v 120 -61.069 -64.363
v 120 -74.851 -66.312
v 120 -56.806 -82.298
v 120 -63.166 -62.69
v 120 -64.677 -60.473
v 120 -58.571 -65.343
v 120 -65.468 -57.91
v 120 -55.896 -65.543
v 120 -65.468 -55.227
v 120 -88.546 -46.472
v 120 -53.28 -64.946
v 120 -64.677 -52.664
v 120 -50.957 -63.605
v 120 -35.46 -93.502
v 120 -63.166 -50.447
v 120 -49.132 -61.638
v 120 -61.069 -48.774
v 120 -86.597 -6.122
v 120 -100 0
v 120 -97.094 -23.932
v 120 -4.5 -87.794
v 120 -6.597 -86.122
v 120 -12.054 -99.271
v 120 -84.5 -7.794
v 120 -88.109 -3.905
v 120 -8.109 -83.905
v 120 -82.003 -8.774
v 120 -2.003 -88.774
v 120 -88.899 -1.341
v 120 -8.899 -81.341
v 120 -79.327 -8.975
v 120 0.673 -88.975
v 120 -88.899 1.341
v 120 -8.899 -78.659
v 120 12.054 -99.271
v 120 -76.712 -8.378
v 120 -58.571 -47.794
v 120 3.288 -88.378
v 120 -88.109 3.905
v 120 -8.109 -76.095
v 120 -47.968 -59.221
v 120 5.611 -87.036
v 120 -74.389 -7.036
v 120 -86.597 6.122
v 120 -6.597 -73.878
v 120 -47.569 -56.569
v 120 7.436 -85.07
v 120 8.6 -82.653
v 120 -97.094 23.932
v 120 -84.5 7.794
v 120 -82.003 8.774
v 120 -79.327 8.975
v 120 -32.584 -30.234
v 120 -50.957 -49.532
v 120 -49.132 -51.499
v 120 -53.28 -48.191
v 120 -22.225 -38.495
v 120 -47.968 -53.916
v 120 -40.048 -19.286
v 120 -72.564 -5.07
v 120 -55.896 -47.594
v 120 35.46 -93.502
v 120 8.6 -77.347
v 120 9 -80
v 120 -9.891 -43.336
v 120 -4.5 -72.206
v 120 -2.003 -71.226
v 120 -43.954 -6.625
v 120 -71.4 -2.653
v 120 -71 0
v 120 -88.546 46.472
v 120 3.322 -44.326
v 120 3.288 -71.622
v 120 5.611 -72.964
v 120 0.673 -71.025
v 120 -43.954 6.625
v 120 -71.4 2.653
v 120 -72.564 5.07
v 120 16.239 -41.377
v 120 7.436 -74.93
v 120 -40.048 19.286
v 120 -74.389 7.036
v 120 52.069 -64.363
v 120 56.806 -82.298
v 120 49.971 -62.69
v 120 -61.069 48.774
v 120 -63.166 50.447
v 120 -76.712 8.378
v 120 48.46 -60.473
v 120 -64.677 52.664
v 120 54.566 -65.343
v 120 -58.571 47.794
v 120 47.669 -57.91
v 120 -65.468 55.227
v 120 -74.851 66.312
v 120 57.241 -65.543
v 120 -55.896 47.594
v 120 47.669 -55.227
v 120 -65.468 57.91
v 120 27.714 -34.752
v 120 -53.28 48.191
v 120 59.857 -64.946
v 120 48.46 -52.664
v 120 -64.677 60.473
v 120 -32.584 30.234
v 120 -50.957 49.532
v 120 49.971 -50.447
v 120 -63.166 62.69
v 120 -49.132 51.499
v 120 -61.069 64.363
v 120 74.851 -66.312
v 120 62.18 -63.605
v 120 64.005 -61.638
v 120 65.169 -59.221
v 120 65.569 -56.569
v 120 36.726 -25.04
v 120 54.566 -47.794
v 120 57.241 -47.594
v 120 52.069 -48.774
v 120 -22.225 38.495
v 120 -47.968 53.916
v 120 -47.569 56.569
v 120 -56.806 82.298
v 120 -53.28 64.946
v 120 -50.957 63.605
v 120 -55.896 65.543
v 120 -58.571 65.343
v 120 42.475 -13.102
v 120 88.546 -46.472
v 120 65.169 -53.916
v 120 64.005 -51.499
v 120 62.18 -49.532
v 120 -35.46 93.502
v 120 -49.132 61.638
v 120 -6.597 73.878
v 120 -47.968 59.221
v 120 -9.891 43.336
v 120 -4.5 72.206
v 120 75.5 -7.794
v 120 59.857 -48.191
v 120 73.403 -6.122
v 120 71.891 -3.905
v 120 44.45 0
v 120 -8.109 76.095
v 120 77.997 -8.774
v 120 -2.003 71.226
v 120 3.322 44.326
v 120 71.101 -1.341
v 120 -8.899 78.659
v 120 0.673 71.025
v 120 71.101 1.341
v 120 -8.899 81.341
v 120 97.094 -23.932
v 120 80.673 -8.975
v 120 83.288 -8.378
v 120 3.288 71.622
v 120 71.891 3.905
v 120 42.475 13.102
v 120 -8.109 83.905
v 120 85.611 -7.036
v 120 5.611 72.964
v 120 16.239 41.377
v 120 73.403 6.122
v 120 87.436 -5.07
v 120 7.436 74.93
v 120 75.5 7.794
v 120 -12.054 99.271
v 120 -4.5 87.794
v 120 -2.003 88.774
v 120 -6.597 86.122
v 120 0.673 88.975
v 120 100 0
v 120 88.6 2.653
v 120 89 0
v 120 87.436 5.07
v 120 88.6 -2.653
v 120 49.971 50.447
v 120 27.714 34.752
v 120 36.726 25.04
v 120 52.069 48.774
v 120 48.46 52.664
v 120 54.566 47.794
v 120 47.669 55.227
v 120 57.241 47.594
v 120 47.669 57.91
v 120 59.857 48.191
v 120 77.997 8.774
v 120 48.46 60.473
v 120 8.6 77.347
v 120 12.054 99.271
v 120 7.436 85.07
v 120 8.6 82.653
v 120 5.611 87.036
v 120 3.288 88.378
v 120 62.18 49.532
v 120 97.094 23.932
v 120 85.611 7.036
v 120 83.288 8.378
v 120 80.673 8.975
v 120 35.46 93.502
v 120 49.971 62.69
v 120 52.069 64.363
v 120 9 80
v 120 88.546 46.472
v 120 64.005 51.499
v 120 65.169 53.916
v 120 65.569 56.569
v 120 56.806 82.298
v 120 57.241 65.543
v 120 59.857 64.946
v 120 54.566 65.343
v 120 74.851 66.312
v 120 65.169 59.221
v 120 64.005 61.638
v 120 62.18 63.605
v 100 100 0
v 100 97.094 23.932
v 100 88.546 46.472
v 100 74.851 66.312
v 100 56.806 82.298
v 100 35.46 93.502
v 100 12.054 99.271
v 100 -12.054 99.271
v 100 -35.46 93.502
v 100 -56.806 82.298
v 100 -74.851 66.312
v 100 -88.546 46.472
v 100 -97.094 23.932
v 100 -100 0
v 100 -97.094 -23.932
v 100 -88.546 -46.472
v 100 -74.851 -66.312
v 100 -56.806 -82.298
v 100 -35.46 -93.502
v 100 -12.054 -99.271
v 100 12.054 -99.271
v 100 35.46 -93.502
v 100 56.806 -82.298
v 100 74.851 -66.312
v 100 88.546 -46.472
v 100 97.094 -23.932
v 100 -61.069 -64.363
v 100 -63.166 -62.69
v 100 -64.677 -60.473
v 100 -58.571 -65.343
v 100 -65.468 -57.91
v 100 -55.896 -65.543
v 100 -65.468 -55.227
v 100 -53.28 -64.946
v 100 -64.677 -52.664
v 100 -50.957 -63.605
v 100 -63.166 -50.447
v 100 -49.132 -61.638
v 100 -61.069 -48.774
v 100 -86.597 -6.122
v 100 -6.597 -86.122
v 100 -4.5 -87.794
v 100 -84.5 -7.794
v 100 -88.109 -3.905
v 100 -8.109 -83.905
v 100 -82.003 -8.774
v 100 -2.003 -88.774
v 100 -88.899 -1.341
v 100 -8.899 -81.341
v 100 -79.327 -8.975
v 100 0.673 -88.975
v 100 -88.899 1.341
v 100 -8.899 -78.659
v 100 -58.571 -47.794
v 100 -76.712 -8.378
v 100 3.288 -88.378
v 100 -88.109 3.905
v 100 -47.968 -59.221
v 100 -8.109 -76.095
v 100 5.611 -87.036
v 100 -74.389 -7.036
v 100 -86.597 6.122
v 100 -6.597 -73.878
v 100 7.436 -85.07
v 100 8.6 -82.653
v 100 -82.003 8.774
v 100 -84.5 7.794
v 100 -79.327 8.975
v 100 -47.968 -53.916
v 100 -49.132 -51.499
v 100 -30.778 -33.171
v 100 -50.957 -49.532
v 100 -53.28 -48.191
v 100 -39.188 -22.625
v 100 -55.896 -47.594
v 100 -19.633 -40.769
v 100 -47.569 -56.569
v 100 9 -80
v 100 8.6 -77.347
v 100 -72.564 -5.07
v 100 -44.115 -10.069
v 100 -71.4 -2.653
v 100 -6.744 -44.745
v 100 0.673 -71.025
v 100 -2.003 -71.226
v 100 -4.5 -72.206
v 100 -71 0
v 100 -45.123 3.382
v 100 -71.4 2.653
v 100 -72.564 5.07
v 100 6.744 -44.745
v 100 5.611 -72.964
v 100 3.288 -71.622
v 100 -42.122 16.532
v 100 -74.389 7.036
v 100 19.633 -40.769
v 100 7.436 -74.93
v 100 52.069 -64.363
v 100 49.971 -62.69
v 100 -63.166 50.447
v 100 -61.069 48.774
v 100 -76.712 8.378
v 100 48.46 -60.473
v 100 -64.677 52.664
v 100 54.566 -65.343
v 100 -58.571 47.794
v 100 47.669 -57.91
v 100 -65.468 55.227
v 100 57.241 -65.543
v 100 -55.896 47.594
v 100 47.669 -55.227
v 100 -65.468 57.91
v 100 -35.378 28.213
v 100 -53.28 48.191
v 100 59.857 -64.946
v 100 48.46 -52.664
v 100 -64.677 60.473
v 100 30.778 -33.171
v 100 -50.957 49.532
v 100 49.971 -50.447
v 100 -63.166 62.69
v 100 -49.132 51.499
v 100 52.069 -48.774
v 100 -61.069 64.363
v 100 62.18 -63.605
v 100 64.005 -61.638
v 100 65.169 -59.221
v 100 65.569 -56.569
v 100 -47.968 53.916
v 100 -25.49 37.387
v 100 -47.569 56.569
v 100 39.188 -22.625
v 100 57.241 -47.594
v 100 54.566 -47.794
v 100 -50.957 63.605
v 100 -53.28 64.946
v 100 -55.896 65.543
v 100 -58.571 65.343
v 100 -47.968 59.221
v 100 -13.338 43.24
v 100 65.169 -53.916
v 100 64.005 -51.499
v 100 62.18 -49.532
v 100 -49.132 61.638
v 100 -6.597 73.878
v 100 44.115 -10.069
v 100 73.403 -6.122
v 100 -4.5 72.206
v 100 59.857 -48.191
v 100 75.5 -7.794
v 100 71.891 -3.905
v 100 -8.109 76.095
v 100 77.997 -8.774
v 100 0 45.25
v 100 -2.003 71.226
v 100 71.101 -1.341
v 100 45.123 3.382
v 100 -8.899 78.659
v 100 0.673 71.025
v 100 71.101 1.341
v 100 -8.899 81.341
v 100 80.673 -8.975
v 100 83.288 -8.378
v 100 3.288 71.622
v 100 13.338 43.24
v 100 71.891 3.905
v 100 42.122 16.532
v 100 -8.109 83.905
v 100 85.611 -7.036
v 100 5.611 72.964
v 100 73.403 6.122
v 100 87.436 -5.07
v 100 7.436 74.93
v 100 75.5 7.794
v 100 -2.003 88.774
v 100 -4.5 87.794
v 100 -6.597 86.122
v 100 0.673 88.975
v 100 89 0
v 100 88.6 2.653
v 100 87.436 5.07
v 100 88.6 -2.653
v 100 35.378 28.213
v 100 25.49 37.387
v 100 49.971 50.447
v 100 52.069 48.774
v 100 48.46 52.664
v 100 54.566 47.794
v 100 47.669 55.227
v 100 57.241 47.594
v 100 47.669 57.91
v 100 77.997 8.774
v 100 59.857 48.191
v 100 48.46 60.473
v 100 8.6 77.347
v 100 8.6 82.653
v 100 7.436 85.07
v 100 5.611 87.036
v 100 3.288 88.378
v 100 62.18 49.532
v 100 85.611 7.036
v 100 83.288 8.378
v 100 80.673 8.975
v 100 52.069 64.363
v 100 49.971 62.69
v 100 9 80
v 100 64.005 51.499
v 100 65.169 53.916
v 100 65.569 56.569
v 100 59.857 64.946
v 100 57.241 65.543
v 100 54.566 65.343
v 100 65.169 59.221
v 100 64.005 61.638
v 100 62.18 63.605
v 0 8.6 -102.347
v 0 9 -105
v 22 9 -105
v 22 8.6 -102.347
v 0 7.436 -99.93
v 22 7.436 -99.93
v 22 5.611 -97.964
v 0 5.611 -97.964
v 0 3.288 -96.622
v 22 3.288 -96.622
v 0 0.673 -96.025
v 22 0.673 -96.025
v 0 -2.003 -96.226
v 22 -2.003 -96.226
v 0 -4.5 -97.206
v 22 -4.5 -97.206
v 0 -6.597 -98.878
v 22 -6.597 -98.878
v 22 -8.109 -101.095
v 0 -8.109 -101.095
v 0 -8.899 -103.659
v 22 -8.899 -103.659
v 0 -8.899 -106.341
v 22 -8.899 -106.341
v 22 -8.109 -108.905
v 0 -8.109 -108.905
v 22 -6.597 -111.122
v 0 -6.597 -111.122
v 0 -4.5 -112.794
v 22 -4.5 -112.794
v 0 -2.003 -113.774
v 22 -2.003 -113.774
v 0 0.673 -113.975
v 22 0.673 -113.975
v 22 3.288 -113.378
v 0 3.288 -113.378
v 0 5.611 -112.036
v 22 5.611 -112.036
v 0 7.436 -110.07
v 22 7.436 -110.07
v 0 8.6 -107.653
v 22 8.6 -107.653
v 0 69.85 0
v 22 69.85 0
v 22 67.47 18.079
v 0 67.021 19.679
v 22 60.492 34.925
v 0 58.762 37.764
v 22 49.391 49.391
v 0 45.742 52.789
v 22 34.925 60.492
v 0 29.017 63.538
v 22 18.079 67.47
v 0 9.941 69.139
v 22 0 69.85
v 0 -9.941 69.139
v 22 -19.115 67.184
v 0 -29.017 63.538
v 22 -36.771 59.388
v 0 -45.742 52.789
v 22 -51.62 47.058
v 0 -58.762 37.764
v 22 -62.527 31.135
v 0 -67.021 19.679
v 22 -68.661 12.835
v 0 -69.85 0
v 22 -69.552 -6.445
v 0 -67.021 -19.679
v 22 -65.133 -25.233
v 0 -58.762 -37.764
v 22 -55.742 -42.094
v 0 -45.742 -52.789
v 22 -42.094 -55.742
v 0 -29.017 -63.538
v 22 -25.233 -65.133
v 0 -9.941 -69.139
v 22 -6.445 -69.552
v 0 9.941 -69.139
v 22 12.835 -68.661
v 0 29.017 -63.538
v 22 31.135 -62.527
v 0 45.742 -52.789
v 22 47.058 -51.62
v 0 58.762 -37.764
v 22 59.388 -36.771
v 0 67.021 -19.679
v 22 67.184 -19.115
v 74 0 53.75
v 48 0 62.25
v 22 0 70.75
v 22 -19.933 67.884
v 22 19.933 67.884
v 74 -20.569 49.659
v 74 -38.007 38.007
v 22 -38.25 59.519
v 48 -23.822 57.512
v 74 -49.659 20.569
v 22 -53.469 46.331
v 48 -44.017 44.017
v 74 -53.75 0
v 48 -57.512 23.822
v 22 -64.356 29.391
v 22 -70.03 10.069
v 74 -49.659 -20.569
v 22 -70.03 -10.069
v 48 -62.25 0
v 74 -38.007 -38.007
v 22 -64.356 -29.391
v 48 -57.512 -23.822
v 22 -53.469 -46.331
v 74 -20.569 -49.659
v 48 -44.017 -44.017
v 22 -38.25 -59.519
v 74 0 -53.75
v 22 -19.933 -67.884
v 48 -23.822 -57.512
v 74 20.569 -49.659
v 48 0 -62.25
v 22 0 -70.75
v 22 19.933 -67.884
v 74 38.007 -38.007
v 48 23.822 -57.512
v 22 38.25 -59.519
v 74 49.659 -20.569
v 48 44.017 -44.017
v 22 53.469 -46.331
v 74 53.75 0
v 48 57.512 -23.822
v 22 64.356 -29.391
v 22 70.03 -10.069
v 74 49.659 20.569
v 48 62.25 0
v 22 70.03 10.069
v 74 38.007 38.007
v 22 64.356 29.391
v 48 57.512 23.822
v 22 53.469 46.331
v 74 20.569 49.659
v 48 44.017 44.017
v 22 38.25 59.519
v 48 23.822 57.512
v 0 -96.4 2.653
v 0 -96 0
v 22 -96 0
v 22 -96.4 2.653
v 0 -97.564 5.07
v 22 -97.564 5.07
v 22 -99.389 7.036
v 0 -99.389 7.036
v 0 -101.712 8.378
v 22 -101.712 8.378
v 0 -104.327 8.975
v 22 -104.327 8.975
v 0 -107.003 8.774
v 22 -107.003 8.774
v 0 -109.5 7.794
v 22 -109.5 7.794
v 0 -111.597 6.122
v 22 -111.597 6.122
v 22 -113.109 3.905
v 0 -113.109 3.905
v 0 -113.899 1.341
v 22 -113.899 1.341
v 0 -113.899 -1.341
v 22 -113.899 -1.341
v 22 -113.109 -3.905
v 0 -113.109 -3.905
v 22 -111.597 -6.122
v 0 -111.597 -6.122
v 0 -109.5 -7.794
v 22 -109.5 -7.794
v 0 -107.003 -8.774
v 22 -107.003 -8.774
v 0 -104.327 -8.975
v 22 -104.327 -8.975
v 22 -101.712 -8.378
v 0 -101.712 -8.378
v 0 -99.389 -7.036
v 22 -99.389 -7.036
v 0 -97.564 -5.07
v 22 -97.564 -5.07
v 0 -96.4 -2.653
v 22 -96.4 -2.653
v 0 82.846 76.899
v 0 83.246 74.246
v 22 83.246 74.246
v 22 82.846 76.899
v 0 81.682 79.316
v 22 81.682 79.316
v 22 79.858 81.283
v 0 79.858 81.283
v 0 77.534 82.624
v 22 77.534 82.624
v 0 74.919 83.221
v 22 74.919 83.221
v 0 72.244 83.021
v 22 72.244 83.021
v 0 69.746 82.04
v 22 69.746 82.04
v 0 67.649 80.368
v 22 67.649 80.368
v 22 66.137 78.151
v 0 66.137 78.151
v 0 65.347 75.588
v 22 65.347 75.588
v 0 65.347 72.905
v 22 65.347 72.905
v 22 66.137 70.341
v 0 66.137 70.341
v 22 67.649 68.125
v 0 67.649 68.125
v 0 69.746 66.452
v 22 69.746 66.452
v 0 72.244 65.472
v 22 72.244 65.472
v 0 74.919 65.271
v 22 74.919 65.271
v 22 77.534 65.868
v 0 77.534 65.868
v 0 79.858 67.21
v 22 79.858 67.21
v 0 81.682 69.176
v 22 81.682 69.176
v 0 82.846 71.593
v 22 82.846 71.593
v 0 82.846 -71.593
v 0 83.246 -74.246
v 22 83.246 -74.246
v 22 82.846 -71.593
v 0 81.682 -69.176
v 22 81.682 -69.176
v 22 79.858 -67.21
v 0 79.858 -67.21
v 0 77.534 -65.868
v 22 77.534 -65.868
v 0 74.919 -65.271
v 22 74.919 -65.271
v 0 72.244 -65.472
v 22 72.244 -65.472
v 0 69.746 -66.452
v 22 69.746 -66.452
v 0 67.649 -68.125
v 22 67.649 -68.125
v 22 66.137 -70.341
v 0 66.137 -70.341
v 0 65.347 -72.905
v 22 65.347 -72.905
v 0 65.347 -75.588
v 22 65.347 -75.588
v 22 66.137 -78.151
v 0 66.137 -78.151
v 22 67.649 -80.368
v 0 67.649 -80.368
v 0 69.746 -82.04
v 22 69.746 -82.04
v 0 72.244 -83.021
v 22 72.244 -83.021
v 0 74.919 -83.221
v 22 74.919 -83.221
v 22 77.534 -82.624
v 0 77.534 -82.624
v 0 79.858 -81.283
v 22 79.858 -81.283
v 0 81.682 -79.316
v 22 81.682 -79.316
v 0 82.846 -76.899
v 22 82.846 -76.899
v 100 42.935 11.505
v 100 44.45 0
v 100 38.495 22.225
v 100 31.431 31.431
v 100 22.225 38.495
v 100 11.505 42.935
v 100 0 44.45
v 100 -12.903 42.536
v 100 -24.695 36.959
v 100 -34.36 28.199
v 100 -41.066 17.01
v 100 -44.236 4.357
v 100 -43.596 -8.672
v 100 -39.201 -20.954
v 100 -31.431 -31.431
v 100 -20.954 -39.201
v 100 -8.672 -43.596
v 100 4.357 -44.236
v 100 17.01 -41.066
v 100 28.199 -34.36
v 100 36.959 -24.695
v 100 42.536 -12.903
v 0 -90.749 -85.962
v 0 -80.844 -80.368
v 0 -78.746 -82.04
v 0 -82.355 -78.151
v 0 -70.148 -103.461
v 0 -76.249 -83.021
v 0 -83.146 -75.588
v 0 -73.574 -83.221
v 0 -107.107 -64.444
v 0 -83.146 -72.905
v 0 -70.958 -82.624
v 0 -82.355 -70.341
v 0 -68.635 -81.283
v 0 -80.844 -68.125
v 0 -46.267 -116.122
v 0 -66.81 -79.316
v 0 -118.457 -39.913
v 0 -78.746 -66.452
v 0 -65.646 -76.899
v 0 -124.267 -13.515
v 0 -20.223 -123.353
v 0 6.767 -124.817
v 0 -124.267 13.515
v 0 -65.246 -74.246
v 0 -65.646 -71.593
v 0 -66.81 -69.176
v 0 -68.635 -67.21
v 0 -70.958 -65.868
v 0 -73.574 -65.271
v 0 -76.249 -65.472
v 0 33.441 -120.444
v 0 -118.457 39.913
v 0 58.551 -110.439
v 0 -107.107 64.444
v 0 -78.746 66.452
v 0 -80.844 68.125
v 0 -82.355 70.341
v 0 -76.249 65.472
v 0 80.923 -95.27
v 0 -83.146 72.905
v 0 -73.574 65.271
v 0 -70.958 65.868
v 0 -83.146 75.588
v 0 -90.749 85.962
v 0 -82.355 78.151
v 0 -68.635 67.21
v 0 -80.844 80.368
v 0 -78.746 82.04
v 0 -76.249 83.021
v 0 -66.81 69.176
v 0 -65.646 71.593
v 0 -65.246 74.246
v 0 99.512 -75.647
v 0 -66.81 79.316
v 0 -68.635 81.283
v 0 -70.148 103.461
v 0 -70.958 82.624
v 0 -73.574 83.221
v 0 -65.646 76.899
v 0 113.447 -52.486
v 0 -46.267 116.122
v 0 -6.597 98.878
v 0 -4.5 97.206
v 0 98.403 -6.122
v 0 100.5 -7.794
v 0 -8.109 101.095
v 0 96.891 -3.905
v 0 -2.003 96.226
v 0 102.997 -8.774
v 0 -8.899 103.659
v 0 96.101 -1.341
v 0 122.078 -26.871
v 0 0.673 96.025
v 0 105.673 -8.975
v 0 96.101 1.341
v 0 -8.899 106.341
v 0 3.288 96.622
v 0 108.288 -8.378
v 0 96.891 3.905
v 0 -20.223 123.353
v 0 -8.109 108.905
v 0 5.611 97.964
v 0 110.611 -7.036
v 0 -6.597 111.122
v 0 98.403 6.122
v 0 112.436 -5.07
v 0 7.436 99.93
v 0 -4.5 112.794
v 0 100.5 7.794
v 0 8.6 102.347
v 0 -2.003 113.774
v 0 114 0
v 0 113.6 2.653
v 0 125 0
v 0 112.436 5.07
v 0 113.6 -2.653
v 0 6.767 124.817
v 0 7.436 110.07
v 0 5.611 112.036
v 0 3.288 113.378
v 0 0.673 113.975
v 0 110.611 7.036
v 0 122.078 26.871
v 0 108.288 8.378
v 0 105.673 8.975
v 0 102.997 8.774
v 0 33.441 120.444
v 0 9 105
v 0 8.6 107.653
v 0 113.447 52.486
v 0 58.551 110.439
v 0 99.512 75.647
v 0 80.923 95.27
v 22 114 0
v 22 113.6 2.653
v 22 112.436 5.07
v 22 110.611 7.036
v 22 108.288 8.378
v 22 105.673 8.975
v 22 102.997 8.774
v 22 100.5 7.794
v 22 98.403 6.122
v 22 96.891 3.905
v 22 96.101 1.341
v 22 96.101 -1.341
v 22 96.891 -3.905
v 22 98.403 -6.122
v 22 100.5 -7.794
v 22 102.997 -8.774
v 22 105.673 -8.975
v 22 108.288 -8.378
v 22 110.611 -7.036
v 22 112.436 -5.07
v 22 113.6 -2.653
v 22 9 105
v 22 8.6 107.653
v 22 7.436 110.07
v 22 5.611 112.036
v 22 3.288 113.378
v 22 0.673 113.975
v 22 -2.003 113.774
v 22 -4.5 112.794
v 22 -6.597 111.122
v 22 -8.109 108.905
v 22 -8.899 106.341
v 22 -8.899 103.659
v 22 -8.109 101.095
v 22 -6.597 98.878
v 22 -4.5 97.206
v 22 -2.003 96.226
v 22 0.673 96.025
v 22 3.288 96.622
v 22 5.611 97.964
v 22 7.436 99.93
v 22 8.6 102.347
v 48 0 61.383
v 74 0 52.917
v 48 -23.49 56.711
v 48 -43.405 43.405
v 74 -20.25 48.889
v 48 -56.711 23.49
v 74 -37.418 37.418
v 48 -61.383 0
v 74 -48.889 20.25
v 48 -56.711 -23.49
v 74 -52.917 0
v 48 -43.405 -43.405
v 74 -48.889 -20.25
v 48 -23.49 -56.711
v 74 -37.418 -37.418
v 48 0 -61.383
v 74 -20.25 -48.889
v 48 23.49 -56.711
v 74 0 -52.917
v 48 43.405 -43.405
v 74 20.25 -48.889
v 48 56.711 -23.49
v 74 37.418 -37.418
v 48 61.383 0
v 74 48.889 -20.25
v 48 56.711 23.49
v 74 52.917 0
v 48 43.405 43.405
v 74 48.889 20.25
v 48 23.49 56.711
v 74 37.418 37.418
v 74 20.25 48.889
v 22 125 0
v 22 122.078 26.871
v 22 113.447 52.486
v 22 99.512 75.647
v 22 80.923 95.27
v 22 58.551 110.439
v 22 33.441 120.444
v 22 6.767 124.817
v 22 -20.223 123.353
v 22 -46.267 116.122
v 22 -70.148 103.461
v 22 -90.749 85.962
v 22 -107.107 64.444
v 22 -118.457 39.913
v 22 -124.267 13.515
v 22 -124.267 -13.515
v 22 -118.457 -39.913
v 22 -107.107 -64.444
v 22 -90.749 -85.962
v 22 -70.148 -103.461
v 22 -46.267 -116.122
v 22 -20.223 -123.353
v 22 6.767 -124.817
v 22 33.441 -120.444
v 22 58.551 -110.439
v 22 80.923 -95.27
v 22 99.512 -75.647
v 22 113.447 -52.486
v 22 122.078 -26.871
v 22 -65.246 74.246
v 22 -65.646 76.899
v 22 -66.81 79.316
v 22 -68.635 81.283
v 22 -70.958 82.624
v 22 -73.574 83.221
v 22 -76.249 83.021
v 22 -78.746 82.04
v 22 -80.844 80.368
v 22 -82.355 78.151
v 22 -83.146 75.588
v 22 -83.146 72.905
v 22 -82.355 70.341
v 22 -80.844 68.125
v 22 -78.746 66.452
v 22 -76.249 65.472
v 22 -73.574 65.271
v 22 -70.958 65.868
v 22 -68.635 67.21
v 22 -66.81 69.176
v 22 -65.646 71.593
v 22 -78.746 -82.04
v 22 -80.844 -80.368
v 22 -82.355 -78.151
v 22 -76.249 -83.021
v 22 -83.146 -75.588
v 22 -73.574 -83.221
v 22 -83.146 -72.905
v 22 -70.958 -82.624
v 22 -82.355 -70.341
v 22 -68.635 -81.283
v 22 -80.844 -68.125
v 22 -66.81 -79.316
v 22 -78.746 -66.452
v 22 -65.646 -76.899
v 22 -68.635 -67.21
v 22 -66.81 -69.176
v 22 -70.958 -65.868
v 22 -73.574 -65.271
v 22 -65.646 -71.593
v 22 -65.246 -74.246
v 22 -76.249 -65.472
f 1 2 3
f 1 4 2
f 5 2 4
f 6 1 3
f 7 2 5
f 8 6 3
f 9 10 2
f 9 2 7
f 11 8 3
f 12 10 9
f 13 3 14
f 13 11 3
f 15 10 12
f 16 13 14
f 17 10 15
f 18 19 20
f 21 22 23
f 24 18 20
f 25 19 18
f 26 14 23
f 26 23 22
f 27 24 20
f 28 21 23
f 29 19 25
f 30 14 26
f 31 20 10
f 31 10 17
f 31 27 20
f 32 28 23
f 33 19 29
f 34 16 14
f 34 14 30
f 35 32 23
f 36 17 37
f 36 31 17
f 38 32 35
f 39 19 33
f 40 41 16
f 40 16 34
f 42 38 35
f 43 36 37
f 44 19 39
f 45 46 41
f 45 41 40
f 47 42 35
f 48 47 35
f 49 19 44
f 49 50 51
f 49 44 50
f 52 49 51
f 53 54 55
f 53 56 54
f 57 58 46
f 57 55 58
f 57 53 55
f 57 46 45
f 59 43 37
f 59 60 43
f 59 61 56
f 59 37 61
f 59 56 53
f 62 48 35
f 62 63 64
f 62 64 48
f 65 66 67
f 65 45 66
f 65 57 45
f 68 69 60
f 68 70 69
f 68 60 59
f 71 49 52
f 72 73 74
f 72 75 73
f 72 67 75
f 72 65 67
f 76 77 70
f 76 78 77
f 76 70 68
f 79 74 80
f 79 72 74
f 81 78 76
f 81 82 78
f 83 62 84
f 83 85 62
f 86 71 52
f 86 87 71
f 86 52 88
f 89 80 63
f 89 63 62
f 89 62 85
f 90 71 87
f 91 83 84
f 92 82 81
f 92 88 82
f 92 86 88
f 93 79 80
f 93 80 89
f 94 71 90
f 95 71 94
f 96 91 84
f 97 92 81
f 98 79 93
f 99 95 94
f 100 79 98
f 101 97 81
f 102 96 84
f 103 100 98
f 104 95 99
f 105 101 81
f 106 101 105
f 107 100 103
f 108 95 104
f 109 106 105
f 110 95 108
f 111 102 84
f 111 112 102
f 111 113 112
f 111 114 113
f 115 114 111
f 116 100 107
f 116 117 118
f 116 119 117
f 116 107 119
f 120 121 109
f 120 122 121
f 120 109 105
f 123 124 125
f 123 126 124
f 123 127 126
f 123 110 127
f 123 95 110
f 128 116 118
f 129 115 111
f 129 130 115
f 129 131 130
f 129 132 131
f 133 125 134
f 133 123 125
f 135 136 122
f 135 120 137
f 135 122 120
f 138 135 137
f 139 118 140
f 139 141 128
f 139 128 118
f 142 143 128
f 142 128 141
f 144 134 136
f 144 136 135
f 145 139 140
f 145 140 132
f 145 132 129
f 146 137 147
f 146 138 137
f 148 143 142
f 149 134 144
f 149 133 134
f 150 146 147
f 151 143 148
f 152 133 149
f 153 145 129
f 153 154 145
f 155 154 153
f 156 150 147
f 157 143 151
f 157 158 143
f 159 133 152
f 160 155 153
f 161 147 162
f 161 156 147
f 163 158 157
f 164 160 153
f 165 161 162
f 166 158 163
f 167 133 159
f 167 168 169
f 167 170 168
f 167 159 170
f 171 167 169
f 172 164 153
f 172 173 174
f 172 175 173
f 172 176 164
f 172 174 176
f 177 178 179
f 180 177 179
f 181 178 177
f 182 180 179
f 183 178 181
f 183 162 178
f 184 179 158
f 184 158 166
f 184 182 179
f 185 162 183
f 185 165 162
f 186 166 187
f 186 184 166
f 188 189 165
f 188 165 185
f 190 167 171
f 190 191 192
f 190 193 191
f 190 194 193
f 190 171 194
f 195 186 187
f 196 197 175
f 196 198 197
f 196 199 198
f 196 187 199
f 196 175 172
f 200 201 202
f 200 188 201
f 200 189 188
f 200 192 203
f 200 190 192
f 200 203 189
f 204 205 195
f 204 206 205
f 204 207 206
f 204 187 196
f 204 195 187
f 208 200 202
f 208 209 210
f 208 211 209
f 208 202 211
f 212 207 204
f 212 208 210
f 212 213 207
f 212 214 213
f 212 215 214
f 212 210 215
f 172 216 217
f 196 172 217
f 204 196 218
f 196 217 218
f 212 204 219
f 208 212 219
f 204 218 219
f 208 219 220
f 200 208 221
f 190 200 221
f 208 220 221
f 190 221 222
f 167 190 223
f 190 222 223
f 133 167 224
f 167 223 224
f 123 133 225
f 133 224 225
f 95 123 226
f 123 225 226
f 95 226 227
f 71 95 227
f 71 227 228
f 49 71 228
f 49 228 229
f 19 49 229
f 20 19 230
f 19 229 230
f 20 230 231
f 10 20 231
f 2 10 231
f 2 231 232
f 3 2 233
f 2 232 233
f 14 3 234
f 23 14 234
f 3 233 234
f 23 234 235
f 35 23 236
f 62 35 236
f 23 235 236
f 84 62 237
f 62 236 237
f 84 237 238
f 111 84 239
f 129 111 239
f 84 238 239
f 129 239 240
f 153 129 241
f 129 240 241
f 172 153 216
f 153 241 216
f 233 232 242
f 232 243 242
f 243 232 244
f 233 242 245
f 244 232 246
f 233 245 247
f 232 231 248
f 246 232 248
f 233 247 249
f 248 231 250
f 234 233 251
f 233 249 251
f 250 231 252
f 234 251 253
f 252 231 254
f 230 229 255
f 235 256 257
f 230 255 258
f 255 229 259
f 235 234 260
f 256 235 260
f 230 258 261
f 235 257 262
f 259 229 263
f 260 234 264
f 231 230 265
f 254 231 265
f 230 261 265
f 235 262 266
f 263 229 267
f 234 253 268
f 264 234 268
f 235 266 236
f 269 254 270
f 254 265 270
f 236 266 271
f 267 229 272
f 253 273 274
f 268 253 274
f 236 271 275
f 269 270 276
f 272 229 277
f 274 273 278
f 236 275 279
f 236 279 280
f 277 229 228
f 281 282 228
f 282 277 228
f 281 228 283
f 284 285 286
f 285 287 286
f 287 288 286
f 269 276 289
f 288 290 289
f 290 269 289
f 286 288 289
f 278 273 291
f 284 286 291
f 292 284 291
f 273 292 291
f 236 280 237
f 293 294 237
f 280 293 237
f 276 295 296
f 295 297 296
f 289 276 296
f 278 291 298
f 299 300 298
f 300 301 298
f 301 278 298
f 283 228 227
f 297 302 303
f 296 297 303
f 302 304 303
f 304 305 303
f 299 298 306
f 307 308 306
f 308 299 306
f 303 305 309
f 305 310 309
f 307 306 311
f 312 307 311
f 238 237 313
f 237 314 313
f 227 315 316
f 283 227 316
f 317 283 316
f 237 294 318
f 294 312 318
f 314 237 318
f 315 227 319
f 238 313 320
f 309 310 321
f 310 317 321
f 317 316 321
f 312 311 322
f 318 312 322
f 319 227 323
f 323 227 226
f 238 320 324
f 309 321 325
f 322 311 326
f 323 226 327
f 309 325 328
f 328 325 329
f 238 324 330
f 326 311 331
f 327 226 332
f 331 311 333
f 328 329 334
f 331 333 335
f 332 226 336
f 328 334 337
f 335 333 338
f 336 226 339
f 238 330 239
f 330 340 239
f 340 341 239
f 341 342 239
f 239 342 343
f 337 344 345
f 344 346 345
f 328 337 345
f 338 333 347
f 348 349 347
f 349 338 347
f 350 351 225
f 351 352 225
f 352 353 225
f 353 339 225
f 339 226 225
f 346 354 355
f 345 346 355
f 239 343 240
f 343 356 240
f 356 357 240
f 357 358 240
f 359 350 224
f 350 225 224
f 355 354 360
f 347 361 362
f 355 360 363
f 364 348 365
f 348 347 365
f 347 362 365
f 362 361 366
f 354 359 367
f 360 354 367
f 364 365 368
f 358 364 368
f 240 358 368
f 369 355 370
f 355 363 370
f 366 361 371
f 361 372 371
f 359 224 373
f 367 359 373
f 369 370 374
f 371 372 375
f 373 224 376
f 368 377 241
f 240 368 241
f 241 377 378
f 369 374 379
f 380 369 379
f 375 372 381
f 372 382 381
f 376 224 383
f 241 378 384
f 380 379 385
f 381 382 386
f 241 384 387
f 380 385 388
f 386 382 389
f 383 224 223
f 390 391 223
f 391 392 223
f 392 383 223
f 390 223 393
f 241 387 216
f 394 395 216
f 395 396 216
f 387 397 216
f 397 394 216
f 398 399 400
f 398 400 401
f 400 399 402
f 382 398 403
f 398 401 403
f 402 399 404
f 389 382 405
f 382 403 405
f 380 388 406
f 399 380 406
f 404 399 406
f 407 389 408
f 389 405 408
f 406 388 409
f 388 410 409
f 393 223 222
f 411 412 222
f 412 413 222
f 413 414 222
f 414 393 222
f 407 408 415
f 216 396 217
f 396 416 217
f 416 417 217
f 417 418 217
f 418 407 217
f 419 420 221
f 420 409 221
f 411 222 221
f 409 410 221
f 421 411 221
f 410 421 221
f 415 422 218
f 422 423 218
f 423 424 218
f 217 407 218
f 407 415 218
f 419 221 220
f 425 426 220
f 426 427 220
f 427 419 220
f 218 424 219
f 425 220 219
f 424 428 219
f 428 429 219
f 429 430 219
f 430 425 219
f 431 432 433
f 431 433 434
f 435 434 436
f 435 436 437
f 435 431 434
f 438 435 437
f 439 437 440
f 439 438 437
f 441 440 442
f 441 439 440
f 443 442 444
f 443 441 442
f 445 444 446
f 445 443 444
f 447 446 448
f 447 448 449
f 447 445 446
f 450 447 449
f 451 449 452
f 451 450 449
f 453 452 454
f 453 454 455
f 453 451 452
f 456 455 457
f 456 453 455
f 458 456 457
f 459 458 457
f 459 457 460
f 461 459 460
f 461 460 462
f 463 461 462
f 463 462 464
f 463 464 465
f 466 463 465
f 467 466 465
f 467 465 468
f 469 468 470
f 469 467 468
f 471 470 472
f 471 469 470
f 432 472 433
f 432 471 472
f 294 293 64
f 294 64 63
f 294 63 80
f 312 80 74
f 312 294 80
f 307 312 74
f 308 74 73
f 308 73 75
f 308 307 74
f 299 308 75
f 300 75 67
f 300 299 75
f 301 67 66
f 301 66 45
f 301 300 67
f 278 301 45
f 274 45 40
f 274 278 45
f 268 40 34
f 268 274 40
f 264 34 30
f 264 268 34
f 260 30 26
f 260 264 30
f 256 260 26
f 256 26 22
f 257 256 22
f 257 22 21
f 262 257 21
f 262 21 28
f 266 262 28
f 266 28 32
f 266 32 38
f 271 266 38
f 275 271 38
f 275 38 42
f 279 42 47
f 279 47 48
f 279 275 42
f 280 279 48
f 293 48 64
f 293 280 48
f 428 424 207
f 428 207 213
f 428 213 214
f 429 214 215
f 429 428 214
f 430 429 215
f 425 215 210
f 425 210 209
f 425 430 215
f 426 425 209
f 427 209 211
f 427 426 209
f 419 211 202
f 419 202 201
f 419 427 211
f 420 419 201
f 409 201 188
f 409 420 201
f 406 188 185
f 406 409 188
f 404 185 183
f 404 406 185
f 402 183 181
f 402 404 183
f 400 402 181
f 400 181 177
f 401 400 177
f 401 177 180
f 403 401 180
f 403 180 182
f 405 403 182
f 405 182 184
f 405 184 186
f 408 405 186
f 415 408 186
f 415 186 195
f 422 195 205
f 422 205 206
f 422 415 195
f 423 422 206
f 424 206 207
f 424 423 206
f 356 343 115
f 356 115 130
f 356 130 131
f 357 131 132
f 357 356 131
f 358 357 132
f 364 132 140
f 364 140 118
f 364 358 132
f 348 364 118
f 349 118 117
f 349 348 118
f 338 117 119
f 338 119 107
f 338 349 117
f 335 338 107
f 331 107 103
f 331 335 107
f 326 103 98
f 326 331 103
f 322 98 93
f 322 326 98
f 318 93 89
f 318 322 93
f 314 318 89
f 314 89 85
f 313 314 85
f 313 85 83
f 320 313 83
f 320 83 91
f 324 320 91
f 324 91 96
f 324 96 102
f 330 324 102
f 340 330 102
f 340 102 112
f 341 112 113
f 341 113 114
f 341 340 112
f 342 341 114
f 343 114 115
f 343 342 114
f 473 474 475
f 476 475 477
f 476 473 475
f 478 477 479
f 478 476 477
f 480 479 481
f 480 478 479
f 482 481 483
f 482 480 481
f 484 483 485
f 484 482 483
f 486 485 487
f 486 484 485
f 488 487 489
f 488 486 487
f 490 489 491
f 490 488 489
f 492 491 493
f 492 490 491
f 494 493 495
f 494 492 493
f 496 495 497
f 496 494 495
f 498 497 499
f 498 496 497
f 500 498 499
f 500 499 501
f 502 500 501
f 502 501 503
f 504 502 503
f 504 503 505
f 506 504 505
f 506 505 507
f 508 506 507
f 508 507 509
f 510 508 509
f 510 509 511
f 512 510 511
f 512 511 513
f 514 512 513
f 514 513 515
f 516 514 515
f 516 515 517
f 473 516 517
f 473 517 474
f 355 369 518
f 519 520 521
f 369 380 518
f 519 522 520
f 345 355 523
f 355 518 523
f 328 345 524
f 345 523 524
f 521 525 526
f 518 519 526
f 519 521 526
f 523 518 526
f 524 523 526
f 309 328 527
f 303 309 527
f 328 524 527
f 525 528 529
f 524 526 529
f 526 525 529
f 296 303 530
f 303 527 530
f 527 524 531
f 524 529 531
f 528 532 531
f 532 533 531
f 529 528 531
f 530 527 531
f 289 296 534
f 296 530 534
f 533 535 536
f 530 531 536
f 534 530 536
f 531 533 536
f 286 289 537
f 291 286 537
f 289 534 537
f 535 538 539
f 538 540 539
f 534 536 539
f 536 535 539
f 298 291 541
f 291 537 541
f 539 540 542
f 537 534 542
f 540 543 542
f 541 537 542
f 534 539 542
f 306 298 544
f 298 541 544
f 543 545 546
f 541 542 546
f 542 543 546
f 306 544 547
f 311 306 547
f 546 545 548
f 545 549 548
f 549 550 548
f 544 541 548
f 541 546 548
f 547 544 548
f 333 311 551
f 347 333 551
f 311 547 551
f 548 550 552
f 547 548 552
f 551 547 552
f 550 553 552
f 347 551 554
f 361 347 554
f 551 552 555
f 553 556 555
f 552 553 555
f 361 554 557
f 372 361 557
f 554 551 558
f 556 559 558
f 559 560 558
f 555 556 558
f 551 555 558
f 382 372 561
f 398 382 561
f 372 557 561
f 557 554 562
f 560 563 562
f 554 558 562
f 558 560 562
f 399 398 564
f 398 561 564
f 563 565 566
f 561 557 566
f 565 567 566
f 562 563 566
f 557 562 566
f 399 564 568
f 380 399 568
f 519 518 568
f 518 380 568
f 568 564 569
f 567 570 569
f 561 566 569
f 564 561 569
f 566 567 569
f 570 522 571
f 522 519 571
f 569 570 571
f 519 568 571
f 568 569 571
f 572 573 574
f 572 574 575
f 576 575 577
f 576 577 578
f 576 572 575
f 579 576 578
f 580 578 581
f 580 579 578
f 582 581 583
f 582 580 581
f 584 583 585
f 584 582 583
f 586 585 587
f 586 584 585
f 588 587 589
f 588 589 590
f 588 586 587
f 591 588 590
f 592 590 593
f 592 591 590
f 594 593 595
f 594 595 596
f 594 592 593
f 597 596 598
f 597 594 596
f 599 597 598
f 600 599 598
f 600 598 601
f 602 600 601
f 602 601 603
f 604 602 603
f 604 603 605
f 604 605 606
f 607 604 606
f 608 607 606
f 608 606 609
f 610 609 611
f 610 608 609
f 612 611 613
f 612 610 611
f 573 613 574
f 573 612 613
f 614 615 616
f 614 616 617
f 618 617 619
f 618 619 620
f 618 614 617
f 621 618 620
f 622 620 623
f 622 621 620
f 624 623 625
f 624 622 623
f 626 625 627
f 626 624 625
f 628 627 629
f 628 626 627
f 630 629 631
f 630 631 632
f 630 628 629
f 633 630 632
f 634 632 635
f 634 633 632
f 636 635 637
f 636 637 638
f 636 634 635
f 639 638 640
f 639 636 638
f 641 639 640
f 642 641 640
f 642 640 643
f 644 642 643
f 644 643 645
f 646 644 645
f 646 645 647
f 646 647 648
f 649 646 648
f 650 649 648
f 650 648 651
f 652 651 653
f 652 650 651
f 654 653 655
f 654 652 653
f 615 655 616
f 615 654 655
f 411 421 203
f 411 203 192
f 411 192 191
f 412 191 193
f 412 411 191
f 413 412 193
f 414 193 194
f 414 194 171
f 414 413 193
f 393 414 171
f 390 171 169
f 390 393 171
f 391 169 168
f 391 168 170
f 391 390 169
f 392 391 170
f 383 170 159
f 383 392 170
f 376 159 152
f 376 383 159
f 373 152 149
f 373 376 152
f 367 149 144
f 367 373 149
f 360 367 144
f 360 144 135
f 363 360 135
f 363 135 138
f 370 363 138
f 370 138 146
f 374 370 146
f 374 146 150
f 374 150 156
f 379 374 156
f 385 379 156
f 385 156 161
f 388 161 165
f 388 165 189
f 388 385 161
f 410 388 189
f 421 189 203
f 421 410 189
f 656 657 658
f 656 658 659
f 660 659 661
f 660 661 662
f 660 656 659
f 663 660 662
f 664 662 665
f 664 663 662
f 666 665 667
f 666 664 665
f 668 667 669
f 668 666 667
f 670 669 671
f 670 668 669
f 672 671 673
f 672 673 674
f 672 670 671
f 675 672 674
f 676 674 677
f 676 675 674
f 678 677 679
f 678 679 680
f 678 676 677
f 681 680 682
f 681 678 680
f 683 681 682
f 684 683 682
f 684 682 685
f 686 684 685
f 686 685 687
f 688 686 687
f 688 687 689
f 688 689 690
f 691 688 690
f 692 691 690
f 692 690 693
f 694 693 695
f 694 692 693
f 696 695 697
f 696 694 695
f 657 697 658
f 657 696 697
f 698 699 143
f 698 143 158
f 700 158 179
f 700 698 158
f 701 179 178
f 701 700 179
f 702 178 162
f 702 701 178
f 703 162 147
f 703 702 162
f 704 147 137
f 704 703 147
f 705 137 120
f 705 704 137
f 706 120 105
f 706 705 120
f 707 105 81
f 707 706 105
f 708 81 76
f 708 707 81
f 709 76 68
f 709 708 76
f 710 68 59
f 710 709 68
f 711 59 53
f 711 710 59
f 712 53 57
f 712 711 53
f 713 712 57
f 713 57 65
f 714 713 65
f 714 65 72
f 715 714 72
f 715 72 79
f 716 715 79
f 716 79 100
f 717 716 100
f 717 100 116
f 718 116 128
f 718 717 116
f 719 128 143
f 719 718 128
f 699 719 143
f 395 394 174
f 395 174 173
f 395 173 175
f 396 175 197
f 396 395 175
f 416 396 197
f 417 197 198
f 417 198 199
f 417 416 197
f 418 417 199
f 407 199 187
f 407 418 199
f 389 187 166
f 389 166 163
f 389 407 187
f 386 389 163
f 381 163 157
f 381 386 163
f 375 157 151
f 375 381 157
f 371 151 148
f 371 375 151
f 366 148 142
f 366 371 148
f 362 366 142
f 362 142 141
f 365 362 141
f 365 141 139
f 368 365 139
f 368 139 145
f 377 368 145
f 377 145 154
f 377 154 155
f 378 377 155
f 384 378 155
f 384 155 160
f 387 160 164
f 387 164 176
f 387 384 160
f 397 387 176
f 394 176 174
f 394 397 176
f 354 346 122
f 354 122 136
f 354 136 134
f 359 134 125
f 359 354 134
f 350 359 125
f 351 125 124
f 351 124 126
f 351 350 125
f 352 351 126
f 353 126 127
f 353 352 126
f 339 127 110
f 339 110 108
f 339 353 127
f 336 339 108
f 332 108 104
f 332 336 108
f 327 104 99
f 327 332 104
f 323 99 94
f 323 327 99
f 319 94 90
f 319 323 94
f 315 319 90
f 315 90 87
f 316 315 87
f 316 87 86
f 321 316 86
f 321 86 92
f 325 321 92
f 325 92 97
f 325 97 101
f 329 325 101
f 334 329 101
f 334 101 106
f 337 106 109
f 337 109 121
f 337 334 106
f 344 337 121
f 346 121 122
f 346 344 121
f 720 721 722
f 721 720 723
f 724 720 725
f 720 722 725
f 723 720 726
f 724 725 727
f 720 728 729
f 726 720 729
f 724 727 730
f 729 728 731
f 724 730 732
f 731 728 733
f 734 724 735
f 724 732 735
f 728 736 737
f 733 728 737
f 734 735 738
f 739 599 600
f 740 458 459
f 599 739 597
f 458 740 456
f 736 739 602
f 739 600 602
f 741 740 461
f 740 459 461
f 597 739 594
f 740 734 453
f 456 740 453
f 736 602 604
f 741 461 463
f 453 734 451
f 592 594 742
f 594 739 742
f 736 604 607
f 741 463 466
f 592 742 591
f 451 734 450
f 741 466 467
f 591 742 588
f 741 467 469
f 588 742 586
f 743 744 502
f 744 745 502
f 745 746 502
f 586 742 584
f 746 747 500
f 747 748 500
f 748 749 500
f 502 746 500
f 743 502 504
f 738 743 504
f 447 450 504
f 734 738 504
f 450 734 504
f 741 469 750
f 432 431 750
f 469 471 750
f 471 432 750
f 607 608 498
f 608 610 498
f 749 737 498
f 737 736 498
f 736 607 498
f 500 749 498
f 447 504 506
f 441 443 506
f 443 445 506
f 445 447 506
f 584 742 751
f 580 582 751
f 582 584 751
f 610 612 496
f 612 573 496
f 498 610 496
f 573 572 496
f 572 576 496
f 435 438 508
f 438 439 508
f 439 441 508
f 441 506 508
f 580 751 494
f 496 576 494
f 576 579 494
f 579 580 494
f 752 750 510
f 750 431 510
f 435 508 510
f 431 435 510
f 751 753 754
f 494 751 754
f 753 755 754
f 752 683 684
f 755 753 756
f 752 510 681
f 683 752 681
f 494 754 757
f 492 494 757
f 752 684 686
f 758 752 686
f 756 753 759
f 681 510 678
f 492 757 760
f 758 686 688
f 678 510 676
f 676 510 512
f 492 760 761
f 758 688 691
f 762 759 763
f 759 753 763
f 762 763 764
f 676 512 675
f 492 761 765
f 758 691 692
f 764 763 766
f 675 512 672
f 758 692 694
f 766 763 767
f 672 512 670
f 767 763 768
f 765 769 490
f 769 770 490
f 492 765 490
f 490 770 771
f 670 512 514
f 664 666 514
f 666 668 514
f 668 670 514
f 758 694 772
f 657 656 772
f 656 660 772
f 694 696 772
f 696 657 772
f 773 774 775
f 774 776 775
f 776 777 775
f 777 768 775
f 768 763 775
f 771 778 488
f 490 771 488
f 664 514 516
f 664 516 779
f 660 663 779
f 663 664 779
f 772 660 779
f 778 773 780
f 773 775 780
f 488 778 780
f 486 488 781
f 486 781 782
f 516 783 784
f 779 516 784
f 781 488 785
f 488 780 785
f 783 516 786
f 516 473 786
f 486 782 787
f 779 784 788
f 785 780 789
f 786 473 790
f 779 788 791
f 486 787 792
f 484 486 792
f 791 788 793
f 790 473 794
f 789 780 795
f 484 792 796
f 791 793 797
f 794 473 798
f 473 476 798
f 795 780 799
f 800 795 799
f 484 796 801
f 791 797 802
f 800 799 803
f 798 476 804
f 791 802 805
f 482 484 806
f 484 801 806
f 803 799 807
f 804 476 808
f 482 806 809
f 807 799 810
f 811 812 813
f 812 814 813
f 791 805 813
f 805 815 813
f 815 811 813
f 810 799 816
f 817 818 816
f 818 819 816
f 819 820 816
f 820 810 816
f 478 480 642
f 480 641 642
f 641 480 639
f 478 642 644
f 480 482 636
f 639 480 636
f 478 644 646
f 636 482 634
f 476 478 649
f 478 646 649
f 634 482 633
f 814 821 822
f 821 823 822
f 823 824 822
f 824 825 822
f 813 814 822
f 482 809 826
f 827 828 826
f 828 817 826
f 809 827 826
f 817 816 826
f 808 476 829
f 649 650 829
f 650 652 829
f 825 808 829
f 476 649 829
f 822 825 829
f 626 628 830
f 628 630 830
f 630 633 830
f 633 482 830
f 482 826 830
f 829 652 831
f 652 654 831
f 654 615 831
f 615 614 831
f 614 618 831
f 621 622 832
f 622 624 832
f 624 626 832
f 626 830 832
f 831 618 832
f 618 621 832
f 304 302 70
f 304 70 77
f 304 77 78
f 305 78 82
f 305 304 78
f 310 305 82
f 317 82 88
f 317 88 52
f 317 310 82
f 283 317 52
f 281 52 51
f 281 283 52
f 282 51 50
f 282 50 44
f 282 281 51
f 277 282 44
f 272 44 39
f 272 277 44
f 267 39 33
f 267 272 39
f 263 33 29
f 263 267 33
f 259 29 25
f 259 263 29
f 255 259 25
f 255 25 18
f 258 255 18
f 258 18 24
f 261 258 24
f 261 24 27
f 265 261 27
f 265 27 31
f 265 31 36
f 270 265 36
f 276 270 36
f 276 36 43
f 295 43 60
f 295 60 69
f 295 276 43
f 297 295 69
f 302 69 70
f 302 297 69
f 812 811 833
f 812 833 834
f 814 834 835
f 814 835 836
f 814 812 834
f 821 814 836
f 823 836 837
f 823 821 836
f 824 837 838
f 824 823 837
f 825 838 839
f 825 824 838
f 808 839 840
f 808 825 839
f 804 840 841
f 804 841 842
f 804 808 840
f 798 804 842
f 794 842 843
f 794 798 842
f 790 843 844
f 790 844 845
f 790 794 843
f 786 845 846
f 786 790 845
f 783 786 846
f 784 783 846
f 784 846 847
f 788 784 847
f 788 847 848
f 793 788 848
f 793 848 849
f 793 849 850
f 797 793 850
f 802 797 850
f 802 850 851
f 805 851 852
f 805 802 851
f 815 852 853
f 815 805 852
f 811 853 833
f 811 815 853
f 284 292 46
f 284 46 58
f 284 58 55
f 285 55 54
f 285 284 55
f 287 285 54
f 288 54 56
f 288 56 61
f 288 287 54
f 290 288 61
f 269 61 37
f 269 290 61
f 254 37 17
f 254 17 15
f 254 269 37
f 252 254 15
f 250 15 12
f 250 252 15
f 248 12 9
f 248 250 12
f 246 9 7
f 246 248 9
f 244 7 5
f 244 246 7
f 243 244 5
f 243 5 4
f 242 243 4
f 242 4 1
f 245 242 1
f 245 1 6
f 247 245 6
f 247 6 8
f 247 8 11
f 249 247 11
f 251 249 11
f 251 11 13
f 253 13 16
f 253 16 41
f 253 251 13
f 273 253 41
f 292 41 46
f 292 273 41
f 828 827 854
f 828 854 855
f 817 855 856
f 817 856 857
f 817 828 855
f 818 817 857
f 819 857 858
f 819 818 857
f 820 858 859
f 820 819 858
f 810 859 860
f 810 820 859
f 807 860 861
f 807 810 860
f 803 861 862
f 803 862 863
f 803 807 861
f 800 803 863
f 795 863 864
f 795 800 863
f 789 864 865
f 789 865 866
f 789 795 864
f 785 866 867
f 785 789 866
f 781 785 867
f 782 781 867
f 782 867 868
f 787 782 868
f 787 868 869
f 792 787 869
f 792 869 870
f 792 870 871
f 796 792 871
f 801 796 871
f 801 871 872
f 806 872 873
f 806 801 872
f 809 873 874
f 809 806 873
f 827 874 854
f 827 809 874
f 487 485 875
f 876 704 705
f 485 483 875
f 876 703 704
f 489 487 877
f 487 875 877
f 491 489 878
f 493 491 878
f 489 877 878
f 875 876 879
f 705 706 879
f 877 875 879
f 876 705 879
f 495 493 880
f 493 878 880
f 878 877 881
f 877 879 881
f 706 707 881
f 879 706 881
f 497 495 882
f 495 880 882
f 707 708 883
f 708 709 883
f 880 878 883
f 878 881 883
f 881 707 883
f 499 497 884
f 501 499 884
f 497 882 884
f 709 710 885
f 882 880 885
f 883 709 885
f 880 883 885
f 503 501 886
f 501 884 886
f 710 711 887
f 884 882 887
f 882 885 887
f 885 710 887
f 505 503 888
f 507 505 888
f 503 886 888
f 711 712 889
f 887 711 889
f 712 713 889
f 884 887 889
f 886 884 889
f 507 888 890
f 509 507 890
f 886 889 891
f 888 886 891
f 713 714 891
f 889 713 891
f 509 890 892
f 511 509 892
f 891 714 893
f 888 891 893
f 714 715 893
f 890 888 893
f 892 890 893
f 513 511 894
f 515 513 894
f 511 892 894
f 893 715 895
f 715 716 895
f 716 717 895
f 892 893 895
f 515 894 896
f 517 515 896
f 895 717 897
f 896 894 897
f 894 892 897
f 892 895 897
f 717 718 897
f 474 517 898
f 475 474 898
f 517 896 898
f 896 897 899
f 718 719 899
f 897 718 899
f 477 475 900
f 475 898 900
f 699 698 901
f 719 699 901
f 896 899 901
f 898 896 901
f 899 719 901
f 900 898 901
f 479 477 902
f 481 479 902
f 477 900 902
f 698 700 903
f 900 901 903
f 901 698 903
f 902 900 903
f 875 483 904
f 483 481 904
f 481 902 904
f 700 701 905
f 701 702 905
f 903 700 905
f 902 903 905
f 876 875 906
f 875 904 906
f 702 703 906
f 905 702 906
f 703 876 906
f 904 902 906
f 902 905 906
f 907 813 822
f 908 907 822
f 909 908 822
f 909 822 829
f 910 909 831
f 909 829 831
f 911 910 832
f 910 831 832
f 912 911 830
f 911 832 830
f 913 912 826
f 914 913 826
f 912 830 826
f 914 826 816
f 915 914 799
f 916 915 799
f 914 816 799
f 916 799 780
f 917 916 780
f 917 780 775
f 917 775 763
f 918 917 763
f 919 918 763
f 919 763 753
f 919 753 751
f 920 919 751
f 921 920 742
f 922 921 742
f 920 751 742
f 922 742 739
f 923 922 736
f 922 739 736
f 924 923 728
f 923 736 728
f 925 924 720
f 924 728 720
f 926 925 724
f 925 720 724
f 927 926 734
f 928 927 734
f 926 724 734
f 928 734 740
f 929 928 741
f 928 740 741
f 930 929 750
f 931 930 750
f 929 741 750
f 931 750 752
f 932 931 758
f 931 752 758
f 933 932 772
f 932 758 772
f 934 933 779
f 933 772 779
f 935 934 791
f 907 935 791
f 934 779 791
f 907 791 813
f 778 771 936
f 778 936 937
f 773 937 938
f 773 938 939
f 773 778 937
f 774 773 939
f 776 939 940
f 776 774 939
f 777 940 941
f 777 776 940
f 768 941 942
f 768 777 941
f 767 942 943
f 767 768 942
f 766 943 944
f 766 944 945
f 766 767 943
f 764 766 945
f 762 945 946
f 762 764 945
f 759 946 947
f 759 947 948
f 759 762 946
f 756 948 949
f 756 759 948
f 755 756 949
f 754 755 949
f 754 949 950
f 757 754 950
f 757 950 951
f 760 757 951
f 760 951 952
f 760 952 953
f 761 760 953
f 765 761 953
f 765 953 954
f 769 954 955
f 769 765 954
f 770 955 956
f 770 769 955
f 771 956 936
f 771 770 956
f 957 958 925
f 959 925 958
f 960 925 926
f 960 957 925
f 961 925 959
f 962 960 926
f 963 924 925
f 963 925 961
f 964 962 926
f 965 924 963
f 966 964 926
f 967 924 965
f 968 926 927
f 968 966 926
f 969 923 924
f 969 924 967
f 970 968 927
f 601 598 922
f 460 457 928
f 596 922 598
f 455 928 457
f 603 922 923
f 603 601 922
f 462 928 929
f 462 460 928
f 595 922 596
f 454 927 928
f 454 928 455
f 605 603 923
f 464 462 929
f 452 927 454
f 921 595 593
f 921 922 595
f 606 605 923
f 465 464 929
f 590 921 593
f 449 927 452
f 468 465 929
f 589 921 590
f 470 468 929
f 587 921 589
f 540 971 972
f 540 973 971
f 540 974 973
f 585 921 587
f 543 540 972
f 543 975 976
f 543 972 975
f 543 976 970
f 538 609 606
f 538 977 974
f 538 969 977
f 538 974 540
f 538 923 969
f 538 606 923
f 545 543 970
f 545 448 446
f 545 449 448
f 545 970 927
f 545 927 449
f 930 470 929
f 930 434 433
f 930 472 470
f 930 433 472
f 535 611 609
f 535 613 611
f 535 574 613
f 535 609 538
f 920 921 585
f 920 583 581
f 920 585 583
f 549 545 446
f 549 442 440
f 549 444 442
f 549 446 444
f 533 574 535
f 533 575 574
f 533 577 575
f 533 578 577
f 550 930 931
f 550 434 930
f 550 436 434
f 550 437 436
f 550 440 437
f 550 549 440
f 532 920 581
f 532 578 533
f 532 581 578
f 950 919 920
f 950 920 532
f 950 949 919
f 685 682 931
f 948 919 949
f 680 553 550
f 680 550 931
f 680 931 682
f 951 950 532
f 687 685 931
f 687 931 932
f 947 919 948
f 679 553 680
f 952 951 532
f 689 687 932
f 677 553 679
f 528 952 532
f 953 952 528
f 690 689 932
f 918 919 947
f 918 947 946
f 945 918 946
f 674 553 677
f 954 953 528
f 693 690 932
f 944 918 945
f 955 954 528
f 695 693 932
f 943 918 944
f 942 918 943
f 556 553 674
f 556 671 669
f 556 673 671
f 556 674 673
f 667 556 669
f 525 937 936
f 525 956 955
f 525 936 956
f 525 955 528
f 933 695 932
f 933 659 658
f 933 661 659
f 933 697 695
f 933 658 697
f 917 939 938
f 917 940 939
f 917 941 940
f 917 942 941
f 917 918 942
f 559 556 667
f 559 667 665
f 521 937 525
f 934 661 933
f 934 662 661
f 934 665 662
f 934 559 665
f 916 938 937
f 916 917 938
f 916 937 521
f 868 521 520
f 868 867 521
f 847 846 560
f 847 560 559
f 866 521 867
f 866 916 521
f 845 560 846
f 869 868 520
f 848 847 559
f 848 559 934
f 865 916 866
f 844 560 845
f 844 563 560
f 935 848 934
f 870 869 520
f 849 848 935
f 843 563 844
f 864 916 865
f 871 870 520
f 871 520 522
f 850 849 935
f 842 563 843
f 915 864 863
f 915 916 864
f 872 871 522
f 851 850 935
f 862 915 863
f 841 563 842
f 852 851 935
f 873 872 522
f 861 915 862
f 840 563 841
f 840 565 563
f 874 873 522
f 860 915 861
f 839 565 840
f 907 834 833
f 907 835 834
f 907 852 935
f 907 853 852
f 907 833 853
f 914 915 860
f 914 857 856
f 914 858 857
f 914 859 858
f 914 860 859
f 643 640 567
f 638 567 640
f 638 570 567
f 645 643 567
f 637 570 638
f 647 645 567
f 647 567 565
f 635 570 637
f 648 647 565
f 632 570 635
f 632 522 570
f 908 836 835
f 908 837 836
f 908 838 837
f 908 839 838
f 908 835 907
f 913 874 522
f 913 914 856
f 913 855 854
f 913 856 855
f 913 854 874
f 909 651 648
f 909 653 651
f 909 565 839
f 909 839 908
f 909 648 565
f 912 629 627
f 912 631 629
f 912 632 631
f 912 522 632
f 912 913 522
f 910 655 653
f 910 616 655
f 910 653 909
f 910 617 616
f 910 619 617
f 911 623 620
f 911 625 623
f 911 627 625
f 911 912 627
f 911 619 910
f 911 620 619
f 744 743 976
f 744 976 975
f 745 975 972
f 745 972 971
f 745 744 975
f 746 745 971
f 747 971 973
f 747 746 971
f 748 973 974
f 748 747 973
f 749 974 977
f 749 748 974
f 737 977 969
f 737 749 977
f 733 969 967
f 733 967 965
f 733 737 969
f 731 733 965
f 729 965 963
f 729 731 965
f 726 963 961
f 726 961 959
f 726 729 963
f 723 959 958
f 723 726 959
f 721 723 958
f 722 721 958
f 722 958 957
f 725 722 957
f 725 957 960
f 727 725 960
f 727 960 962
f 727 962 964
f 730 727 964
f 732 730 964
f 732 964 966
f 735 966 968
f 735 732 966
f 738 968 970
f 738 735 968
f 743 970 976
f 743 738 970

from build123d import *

# Parameters (mm, degrees)
F0_R     = 125
F0_R_2   = 9
F0_R_3   = 70.75
F0_R_4   = 69.85
F1_DEPTH = 22
F3_R     = 100
F3_R_2   = 9
F3_R_3   = 45.25
F3_R_4   = 44.45
F4_DEPTH = 20


with BuildPart() as f1:
    # F0 (on Right) → F1 (new body)
    with BuildSketch(Plane.YZ):
        Circle(F0_R)
        with Locations((-74.246212, -74.246212)):
            Circle(F0_R_2, mode=Mode.SUBTRACT)
        with Locations((0, -105)):
            Circle(F0_R_2, mode=Mode.SUBTRACT)
        with Locations((74.246212, -74.246212)):
            Circle(F0_R_2, mode=Mode.SUBTRACT)
        with Locations((-105, 0)):
            Circle(F0_R_2, mode=Mode.SUBTRACT)
        with Locations((-74.246212, 74.246212)):
            Circle(F0_R_2, mode=Mode.SUBTRACT)
        Circle(F0_R_3, mode=Mode.SUBTRACT)
        with Locations((105, 0)):
            Circle(F0_R_2, mode=Mode.SUBTRACT)
        with Locations((0, 105)):
            Circle(F0_R_2, mode=Mode.SUBTRACT)
        with Locations((74.246212, 74.246212)):
            Circle(F0_R_2, mode=Mode.SUBTRACT)
        Circle(F0_R_3)
        Circle(F0_R_4, mode=Mode.SUBTRACT)
    extrude(amount=F1_DEPTH)



with BuildPart() as f4:
    # F3 (on offset) → F4 (new body)
    with BuildSketch(Plane.YZ.offset(100)):
        Circle(F3_R)
        with Locations((-56.568542, -56.568542)):
            Circle(F3_R_2, mode=Mode.SUBTRACT)
        with Locations((0, -80)):
            Circle(F3_R_2, mode=Mode.SUBTRACT)
        with Locations((56.568542, -56.568542)):
            Circle(F3_R_2, mode=Mode.SUBTRACT)
        with Locations((-80, 0)):
            Circle(F3_R_2, mode=Mode.SUBTRACT)
        with Locations((-56.568542, 56.568542)):
            Circle(F3_R_2, mode=Mode.SUBTRACT)
        Circle(F3_R_3, mode=Mode.SUBTRACT)
        with Locations((80, 0)):
            Circle(F3_R_2, mode=Mode.SUBTRACT)
        with Locations((0, 80)):
            Circle(F3_R_2, mode=Mode.SUBTRACT)
        with Locations((56.568542, 56.568542)):
            Circle(F3_R_2, mode=Mode.SUBTRACT)
        Circle(F3_R_3)
        Circle(F3_R_4, mode=Mode.SUBTRACT)
    extrude(amount=F4_DEPTH)


with BuildPart() as f1_1:
    add(f1.part)

    add(f4.part)  # F7 merges F4
    # F6 (on Front) → F7 (revolve)
    with BuildSketch(Plane.XZ):
        Polygon((100, 45.25), (22, 70.75), (22, 69.85), (100, 44.45), align=None)
    revolve(axis=Axis((82.332404, 0, 0), (1, 0, 0)))


solid = f1_1.part
